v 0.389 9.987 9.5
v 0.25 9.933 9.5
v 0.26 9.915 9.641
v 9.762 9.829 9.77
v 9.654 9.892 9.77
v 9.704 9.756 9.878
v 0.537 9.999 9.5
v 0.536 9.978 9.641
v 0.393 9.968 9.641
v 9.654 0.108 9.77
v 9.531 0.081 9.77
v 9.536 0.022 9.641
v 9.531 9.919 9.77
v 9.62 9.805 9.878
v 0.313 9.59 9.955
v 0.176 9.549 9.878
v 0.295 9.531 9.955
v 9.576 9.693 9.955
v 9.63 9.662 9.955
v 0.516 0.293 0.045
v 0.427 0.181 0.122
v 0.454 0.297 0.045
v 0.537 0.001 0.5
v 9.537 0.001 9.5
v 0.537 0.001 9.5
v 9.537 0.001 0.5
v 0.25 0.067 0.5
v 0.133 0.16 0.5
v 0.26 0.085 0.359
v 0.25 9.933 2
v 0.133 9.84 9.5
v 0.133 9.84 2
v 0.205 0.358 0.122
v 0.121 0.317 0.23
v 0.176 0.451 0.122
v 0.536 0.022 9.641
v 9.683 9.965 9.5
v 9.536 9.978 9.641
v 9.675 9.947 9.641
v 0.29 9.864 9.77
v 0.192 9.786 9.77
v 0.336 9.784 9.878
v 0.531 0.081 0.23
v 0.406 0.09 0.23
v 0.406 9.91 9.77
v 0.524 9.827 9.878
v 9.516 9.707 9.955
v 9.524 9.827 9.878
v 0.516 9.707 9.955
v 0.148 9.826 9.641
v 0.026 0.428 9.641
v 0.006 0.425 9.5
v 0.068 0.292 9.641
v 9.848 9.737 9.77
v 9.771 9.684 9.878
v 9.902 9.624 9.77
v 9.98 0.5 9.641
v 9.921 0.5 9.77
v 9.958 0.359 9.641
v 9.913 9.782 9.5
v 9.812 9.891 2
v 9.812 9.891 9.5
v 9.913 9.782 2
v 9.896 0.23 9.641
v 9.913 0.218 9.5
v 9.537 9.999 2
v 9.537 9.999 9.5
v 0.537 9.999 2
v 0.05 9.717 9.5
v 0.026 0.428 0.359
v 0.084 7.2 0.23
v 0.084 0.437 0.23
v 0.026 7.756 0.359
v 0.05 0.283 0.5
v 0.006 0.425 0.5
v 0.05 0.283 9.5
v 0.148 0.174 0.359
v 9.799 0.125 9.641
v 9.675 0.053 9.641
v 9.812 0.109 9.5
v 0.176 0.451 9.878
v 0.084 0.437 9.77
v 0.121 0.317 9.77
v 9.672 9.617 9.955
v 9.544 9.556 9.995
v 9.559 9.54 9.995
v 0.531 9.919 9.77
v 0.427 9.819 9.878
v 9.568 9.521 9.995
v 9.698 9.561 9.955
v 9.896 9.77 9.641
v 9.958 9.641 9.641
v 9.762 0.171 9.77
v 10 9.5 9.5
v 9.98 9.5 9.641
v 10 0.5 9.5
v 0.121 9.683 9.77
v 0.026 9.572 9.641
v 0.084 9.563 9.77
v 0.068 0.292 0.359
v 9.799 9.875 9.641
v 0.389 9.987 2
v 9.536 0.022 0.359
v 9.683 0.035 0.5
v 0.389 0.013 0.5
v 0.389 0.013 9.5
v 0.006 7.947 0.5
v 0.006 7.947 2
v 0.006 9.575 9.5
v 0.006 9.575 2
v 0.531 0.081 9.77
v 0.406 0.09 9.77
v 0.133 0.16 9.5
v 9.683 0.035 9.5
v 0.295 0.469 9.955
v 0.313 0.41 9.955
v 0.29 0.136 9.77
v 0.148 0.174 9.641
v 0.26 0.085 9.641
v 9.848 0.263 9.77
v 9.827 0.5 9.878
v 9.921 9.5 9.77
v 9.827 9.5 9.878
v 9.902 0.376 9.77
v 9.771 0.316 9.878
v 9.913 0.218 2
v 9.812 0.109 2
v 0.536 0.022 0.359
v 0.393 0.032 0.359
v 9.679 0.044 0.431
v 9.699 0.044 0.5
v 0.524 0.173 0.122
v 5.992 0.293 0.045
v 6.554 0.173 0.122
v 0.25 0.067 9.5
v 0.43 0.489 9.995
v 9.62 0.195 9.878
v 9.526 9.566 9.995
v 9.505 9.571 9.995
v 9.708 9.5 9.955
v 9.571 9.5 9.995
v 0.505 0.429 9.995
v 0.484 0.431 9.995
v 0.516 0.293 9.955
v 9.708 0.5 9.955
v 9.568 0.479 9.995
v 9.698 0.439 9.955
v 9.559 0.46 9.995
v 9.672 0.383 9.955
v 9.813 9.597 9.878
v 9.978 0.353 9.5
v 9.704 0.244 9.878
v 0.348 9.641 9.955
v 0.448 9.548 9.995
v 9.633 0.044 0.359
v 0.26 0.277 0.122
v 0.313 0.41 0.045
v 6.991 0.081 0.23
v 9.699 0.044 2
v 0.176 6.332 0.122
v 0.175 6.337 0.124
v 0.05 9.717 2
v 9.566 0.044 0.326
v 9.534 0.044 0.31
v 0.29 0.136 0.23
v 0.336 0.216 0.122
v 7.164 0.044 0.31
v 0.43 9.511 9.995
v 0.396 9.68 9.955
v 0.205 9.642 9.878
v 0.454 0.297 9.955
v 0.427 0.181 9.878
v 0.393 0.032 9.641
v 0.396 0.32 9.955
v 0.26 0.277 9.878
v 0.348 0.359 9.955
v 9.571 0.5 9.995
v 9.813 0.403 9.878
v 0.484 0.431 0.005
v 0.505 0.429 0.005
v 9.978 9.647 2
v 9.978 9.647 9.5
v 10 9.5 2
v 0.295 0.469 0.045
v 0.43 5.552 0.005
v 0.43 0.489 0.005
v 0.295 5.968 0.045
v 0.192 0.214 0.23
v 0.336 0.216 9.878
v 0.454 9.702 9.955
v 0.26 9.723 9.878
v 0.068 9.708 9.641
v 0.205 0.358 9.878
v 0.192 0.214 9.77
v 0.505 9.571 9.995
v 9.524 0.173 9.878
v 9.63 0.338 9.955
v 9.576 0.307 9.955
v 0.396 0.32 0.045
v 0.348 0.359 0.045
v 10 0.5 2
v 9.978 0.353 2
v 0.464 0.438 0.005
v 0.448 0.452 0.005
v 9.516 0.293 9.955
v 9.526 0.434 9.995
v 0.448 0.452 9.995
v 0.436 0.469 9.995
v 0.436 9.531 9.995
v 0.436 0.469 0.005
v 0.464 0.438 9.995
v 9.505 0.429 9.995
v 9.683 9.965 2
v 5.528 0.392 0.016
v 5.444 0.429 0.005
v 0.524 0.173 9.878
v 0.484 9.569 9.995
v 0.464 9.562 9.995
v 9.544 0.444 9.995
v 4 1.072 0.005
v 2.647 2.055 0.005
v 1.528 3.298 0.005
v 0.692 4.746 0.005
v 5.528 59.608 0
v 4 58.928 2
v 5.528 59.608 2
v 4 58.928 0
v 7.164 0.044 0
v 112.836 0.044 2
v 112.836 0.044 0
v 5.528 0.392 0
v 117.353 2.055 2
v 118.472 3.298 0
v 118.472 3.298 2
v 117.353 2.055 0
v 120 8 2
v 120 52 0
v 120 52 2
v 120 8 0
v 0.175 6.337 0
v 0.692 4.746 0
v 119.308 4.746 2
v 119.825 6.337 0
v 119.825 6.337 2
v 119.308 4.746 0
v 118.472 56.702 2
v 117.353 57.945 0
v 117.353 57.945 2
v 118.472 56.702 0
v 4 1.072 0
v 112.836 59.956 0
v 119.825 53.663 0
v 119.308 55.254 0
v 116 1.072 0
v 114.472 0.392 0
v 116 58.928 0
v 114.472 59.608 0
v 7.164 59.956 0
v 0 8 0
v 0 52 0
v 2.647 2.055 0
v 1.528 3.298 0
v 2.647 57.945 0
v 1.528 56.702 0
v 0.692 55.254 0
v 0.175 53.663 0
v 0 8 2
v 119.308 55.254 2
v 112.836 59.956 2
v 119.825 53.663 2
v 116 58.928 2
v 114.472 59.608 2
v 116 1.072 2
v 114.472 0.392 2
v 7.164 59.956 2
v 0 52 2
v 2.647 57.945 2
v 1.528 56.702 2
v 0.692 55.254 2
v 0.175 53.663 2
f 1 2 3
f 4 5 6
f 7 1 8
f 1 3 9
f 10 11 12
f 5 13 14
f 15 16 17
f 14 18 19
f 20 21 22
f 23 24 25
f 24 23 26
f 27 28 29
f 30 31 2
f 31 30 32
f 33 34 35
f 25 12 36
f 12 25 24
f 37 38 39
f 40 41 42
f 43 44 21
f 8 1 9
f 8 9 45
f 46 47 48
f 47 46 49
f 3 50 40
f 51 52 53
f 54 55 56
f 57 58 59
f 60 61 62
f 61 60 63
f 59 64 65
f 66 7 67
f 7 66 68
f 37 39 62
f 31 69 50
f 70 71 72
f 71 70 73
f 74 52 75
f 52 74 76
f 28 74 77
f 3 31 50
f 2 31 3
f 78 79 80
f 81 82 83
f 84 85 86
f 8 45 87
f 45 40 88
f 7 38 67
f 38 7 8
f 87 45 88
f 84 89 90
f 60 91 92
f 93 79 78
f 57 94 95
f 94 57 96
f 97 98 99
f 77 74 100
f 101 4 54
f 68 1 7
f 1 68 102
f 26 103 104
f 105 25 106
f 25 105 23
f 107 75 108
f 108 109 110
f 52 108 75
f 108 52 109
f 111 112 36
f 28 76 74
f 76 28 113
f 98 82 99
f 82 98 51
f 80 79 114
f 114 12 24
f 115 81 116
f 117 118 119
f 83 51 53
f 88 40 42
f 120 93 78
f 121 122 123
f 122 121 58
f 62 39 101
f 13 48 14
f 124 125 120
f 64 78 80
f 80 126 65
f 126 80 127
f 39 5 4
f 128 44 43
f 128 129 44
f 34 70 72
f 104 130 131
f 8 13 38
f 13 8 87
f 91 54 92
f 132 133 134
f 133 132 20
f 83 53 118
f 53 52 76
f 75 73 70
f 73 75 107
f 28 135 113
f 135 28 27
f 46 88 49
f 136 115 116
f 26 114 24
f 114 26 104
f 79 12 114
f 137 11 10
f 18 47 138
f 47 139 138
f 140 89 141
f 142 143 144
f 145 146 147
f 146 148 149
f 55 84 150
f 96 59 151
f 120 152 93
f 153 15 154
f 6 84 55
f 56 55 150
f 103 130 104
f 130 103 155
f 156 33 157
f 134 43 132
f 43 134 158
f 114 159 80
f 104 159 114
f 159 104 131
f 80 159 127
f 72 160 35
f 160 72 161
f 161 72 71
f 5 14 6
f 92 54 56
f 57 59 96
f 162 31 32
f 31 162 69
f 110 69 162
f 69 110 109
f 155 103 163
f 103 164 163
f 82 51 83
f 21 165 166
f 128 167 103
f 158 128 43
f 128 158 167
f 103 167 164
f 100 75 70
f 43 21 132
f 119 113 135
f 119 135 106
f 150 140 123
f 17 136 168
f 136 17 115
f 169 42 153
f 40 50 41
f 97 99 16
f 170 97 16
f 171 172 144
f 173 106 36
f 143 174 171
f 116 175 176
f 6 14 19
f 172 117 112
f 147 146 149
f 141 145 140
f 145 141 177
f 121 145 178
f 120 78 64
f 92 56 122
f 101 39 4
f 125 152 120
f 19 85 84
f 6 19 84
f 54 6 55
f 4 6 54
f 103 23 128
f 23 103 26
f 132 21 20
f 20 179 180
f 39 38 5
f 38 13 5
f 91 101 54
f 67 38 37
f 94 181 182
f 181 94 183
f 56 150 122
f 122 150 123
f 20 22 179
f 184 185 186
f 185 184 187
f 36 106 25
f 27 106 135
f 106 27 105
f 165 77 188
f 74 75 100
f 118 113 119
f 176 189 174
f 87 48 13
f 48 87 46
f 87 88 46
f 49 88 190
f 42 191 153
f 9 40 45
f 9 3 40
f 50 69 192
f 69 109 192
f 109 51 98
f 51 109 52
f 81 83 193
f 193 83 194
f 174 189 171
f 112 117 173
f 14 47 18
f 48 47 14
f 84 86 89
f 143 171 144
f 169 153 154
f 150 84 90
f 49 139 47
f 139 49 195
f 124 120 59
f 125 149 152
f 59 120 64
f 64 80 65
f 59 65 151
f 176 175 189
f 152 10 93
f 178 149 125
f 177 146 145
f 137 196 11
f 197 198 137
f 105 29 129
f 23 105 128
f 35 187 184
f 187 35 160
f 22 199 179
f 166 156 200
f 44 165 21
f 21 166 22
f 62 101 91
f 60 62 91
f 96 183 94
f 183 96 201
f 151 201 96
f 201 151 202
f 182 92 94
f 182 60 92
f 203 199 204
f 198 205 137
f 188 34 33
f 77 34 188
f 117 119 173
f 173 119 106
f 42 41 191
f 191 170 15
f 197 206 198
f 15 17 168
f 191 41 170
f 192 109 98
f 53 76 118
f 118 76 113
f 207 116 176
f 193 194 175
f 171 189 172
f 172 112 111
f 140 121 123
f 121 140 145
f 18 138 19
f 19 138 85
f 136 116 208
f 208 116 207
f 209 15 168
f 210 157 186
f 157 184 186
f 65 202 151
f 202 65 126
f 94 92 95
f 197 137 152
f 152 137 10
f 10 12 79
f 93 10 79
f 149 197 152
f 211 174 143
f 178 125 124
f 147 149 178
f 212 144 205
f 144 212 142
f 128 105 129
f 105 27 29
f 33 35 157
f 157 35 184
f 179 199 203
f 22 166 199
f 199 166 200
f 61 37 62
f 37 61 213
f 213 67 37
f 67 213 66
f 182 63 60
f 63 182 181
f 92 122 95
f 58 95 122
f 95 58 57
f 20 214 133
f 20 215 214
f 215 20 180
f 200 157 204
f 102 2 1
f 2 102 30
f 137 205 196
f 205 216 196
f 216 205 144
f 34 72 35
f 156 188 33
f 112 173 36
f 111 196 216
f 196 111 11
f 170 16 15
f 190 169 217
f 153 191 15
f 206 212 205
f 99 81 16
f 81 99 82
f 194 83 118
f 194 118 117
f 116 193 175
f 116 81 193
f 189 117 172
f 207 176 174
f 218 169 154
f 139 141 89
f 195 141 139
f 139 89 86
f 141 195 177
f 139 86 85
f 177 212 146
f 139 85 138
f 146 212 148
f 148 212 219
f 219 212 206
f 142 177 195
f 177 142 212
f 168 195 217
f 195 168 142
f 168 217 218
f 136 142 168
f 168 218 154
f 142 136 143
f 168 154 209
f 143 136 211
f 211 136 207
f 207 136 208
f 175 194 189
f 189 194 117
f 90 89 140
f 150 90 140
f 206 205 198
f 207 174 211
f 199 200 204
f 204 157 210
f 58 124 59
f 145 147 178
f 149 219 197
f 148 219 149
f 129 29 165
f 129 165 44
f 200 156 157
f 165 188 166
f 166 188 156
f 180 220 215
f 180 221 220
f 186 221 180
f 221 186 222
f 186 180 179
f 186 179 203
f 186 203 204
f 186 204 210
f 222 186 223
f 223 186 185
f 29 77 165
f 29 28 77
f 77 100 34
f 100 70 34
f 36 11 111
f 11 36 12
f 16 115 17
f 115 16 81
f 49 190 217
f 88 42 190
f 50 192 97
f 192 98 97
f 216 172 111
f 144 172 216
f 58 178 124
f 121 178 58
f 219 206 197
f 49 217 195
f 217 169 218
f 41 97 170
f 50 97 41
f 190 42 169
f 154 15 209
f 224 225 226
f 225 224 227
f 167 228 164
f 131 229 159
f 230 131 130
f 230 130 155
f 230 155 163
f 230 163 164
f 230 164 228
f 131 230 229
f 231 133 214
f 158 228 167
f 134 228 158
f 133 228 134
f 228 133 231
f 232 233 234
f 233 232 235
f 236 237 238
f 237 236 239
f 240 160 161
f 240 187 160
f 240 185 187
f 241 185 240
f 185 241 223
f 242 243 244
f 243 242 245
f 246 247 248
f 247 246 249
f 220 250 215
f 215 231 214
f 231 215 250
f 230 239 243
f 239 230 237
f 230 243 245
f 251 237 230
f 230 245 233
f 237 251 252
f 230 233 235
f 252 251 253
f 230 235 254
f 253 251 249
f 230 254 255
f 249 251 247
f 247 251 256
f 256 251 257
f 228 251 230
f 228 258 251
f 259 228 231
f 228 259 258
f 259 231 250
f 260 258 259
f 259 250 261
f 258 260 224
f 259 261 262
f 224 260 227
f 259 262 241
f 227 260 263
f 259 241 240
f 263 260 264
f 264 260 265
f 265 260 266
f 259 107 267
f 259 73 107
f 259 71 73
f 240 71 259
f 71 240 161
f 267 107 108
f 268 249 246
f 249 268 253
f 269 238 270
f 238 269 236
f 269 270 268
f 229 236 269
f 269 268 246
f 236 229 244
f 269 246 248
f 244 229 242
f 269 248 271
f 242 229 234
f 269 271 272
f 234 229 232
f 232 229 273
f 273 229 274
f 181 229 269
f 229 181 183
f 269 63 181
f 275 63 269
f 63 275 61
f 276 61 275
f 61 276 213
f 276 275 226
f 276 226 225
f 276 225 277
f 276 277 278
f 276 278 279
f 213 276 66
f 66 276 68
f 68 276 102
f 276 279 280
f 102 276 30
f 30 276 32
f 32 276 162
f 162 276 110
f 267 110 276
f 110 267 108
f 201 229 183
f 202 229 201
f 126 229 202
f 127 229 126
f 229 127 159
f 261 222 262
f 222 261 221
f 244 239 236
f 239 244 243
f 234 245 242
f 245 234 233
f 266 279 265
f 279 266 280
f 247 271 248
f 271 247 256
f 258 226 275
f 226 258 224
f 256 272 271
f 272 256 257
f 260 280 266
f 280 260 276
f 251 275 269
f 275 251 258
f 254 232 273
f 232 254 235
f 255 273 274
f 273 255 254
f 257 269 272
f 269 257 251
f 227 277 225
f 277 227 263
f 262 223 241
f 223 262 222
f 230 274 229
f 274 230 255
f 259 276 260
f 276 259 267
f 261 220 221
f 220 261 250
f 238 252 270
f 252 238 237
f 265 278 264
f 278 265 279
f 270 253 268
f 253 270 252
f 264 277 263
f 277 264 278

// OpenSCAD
// file: triangular_prism.scad
module triangular_prism(size = [7, 5, 5]) {
    epsilon = 0.01;
    length = size[0];
    width = size[1];
    height = size[2];
    angle = atan(height / width);

    difference() {
        cube(size);
        translate([0, 0, height]) {
            rotate(a = - angle, v = [1, 0, 0]) {
                translate([-(epsilon / 2), 0, 0])
                cube([size[0] + epsilon, sqrt(pow(width, 2) + pow(height, 2)), size[2]]);
            }
        }
    }
}
// file: rounded_rect.scad
module rounded_rect(length = 120, width = 60, thickness = 2, centre = false, corner_radius = 8) {
   assert(2 * corner_radius < width, "Radius must be less than half the width");
   assert(2 * corner_radius < length, "Radius must be less than half the length");

   t = (centre == false) ? [0, 0, 0] : [-length / 2, -width / 2, -thickness / 2];

   ymax = width - corner_radius;
   xmax = length - corner_radius;

   translate(v = t) {
      hull() {
         for (x = [corner_radius, xmax]) {
            for (y = [corner_radius, ymax]) {
               translate(v = [x, y, thickness / 2]) {
                  cylinder(h = thickness, r = corner_radius, center = true);
               }
            }
         }
      }
   }
}

// Test code
rounded_rect();
// file: rounded_cube.scad
module rounded_cube(size = 10, center = false, radius = 0.5, apply_to = "all") {
   // If size is passed as a number, treat it as an [x, y, z] vector
   size = (size[0] == undef) ? [size, size, size] : size;

   translate_min = radius;
   translate_xmax = size[0] - radius;
   translate_ymax = size[1] - radius;
   translate_zmax = size[2] - radius;

   t = (center == false) ? [0, 0, 0] : [- (size[0] / 2), - (size[1] / 2), - (size[2] / 2)];

   translate(v = t) {
      hull() {
         for (translate_x = [translate_min, translate_xmax]) {
            x_at = (translate_x == translate_min) ? "min" : "max";
            for (translate_y = [translate_min, translate_ymax]) {
               y_at = (translate_y == translate_min) ? "min" : "max";
               for (translate_z = [translate_min, translate_zmax]) {
                  z_at = (translate_z == translate_min) ? "min" : "max";

                  translate(v = [translate_x, translate_y, translate_z])
                     if (
                     (apply_to == "all") ||
                     (apply_to == "xmin" && x_at == "min") || (apply_to == "xmax" && x_at == "max") ||
                     (apply_to == "ymin" && y_at == "min") || (apply_to == "ymax" && y_at == "max") ||
                     (apply_to == "zmin" && z_at == "min") || (apply_to == "zmax" && z_at == "max")
                     ) {
                        sphere(r = radius);
                     } else {
                        rotate =
                           (apply_to == "xmin" || apply_to == "xmax" || apply_to == "x") ? [0, 90, 0] : (
                           (apply_to == "ymin" || apply_to == "ymax" || apply_to == "y") ? [90, 90, 0] :
                                   [0, 0, 0]
                        );
                        rotate(a = rotate)
                           cylinder(h = radius * 2, r = radius, center = true);
                     }
               }
            }
         }
      }
   }
}

// Test code
$fs = 0.15;
rounded_cube();
// main file
// Re-exports for this module collection.
// Users need only 'use <lib.scad>' to bring all supported modules into scope.

include <rounded_cube.scad>;
include <rounded_rect.scad>;
include <triangular_prism.scad>;
